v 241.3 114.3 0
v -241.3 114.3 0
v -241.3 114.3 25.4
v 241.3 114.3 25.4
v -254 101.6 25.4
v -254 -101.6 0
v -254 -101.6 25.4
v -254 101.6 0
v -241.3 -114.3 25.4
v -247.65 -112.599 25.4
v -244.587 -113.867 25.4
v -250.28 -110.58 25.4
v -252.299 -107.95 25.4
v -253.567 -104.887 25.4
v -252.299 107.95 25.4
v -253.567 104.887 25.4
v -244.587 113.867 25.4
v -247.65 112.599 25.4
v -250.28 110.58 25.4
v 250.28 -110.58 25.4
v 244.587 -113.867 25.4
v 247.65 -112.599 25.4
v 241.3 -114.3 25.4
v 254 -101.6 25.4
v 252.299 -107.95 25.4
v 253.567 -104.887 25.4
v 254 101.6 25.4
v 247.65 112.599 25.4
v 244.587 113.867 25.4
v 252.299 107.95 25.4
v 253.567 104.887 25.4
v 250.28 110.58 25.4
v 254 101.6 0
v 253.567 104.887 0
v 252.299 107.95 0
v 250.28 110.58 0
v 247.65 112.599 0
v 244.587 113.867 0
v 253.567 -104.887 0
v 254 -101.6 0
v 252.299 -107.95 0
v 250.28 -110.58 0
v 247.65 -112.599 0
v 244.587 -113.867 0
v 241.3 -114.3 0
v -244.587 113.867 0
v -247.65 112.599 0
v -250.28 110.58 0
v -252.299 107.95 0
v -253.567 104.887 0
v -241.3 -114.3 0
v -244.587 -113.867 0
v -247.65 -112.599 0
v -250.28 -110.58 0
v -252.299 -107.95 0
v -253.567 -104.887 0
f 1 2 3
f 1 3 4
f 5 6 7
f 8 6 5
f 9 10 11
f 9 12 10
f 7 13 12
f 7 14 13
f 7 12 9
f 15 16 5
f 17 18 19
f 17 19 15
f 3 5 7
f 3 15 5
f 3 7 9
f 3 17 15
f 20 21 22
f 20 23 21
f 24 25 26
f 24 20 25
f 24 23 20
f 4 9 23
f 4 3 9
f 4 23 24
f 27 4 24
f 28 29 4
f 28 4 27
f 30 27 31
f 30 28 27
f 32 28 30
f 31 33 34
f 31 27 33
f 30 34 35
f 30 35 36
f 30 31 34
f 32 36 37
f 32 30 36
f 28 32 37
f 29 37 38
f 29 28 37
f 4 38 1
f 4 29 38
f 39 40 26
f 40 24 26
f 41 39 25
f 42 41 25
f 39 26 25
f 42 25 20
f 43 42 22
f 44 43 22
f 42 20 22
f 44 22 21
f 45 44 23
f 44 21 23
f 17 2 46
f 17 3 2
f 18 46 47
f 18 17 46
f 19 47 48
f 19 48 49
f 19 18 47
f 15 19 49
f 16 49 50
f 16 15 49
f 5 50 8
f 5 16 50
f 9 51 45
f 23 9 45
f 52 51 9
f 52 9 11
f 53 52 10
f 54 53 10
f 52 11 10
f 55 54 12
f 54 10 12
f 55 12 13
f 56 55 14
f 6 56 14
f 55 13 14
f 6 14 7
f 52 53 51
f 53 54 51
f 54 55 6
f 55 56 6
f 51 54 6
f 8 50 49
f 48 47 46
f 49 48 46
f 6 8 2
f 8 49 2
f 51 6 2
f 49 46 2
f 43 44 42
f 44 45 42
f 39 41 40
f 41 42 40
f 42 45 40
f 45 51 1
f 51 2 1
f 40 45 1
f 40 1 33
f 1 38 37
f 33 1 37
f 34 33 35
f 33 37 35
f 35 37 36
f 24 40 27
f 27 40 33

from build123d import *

# Parameters (mm, degrees)
SKETCH1_W           = 508
SKETCH1_H           = 228.6
BOSS_EXTRUDE1_DEPTH = 25.4
FILLET3_R           = 12.7
FILLET4_R           = 12.7


with BuildPart() as part:
    # Sketch1 → Boss-Extrude1 (new body)
    with BuildSketch(Plane.XY):
        Rectangle(SKETCH1_W, SKETCH1_H)
    extrude(amount=BOSS_EXTRUDE1_DEPTH)

    # Fillet3
    fillet3_edges = [part.edges().sort_by_distance(p)[0] for p in [
        (254, 114.3, 12.7),
    ]]
    fillet(fillet3_edges, radius=FILLET3_R)

    # Fillet4
    fillet4_edges = [part.edges().sort_by_distance(p)[0] for p in [
        (-254, -114.3, 12.7),
        (254, -114.3, 12.7),
        (-254, 114.3, 12.7),
    ]]
    fillet(fillet4_edges, radius=FILLET4_R)


solid = part.part
